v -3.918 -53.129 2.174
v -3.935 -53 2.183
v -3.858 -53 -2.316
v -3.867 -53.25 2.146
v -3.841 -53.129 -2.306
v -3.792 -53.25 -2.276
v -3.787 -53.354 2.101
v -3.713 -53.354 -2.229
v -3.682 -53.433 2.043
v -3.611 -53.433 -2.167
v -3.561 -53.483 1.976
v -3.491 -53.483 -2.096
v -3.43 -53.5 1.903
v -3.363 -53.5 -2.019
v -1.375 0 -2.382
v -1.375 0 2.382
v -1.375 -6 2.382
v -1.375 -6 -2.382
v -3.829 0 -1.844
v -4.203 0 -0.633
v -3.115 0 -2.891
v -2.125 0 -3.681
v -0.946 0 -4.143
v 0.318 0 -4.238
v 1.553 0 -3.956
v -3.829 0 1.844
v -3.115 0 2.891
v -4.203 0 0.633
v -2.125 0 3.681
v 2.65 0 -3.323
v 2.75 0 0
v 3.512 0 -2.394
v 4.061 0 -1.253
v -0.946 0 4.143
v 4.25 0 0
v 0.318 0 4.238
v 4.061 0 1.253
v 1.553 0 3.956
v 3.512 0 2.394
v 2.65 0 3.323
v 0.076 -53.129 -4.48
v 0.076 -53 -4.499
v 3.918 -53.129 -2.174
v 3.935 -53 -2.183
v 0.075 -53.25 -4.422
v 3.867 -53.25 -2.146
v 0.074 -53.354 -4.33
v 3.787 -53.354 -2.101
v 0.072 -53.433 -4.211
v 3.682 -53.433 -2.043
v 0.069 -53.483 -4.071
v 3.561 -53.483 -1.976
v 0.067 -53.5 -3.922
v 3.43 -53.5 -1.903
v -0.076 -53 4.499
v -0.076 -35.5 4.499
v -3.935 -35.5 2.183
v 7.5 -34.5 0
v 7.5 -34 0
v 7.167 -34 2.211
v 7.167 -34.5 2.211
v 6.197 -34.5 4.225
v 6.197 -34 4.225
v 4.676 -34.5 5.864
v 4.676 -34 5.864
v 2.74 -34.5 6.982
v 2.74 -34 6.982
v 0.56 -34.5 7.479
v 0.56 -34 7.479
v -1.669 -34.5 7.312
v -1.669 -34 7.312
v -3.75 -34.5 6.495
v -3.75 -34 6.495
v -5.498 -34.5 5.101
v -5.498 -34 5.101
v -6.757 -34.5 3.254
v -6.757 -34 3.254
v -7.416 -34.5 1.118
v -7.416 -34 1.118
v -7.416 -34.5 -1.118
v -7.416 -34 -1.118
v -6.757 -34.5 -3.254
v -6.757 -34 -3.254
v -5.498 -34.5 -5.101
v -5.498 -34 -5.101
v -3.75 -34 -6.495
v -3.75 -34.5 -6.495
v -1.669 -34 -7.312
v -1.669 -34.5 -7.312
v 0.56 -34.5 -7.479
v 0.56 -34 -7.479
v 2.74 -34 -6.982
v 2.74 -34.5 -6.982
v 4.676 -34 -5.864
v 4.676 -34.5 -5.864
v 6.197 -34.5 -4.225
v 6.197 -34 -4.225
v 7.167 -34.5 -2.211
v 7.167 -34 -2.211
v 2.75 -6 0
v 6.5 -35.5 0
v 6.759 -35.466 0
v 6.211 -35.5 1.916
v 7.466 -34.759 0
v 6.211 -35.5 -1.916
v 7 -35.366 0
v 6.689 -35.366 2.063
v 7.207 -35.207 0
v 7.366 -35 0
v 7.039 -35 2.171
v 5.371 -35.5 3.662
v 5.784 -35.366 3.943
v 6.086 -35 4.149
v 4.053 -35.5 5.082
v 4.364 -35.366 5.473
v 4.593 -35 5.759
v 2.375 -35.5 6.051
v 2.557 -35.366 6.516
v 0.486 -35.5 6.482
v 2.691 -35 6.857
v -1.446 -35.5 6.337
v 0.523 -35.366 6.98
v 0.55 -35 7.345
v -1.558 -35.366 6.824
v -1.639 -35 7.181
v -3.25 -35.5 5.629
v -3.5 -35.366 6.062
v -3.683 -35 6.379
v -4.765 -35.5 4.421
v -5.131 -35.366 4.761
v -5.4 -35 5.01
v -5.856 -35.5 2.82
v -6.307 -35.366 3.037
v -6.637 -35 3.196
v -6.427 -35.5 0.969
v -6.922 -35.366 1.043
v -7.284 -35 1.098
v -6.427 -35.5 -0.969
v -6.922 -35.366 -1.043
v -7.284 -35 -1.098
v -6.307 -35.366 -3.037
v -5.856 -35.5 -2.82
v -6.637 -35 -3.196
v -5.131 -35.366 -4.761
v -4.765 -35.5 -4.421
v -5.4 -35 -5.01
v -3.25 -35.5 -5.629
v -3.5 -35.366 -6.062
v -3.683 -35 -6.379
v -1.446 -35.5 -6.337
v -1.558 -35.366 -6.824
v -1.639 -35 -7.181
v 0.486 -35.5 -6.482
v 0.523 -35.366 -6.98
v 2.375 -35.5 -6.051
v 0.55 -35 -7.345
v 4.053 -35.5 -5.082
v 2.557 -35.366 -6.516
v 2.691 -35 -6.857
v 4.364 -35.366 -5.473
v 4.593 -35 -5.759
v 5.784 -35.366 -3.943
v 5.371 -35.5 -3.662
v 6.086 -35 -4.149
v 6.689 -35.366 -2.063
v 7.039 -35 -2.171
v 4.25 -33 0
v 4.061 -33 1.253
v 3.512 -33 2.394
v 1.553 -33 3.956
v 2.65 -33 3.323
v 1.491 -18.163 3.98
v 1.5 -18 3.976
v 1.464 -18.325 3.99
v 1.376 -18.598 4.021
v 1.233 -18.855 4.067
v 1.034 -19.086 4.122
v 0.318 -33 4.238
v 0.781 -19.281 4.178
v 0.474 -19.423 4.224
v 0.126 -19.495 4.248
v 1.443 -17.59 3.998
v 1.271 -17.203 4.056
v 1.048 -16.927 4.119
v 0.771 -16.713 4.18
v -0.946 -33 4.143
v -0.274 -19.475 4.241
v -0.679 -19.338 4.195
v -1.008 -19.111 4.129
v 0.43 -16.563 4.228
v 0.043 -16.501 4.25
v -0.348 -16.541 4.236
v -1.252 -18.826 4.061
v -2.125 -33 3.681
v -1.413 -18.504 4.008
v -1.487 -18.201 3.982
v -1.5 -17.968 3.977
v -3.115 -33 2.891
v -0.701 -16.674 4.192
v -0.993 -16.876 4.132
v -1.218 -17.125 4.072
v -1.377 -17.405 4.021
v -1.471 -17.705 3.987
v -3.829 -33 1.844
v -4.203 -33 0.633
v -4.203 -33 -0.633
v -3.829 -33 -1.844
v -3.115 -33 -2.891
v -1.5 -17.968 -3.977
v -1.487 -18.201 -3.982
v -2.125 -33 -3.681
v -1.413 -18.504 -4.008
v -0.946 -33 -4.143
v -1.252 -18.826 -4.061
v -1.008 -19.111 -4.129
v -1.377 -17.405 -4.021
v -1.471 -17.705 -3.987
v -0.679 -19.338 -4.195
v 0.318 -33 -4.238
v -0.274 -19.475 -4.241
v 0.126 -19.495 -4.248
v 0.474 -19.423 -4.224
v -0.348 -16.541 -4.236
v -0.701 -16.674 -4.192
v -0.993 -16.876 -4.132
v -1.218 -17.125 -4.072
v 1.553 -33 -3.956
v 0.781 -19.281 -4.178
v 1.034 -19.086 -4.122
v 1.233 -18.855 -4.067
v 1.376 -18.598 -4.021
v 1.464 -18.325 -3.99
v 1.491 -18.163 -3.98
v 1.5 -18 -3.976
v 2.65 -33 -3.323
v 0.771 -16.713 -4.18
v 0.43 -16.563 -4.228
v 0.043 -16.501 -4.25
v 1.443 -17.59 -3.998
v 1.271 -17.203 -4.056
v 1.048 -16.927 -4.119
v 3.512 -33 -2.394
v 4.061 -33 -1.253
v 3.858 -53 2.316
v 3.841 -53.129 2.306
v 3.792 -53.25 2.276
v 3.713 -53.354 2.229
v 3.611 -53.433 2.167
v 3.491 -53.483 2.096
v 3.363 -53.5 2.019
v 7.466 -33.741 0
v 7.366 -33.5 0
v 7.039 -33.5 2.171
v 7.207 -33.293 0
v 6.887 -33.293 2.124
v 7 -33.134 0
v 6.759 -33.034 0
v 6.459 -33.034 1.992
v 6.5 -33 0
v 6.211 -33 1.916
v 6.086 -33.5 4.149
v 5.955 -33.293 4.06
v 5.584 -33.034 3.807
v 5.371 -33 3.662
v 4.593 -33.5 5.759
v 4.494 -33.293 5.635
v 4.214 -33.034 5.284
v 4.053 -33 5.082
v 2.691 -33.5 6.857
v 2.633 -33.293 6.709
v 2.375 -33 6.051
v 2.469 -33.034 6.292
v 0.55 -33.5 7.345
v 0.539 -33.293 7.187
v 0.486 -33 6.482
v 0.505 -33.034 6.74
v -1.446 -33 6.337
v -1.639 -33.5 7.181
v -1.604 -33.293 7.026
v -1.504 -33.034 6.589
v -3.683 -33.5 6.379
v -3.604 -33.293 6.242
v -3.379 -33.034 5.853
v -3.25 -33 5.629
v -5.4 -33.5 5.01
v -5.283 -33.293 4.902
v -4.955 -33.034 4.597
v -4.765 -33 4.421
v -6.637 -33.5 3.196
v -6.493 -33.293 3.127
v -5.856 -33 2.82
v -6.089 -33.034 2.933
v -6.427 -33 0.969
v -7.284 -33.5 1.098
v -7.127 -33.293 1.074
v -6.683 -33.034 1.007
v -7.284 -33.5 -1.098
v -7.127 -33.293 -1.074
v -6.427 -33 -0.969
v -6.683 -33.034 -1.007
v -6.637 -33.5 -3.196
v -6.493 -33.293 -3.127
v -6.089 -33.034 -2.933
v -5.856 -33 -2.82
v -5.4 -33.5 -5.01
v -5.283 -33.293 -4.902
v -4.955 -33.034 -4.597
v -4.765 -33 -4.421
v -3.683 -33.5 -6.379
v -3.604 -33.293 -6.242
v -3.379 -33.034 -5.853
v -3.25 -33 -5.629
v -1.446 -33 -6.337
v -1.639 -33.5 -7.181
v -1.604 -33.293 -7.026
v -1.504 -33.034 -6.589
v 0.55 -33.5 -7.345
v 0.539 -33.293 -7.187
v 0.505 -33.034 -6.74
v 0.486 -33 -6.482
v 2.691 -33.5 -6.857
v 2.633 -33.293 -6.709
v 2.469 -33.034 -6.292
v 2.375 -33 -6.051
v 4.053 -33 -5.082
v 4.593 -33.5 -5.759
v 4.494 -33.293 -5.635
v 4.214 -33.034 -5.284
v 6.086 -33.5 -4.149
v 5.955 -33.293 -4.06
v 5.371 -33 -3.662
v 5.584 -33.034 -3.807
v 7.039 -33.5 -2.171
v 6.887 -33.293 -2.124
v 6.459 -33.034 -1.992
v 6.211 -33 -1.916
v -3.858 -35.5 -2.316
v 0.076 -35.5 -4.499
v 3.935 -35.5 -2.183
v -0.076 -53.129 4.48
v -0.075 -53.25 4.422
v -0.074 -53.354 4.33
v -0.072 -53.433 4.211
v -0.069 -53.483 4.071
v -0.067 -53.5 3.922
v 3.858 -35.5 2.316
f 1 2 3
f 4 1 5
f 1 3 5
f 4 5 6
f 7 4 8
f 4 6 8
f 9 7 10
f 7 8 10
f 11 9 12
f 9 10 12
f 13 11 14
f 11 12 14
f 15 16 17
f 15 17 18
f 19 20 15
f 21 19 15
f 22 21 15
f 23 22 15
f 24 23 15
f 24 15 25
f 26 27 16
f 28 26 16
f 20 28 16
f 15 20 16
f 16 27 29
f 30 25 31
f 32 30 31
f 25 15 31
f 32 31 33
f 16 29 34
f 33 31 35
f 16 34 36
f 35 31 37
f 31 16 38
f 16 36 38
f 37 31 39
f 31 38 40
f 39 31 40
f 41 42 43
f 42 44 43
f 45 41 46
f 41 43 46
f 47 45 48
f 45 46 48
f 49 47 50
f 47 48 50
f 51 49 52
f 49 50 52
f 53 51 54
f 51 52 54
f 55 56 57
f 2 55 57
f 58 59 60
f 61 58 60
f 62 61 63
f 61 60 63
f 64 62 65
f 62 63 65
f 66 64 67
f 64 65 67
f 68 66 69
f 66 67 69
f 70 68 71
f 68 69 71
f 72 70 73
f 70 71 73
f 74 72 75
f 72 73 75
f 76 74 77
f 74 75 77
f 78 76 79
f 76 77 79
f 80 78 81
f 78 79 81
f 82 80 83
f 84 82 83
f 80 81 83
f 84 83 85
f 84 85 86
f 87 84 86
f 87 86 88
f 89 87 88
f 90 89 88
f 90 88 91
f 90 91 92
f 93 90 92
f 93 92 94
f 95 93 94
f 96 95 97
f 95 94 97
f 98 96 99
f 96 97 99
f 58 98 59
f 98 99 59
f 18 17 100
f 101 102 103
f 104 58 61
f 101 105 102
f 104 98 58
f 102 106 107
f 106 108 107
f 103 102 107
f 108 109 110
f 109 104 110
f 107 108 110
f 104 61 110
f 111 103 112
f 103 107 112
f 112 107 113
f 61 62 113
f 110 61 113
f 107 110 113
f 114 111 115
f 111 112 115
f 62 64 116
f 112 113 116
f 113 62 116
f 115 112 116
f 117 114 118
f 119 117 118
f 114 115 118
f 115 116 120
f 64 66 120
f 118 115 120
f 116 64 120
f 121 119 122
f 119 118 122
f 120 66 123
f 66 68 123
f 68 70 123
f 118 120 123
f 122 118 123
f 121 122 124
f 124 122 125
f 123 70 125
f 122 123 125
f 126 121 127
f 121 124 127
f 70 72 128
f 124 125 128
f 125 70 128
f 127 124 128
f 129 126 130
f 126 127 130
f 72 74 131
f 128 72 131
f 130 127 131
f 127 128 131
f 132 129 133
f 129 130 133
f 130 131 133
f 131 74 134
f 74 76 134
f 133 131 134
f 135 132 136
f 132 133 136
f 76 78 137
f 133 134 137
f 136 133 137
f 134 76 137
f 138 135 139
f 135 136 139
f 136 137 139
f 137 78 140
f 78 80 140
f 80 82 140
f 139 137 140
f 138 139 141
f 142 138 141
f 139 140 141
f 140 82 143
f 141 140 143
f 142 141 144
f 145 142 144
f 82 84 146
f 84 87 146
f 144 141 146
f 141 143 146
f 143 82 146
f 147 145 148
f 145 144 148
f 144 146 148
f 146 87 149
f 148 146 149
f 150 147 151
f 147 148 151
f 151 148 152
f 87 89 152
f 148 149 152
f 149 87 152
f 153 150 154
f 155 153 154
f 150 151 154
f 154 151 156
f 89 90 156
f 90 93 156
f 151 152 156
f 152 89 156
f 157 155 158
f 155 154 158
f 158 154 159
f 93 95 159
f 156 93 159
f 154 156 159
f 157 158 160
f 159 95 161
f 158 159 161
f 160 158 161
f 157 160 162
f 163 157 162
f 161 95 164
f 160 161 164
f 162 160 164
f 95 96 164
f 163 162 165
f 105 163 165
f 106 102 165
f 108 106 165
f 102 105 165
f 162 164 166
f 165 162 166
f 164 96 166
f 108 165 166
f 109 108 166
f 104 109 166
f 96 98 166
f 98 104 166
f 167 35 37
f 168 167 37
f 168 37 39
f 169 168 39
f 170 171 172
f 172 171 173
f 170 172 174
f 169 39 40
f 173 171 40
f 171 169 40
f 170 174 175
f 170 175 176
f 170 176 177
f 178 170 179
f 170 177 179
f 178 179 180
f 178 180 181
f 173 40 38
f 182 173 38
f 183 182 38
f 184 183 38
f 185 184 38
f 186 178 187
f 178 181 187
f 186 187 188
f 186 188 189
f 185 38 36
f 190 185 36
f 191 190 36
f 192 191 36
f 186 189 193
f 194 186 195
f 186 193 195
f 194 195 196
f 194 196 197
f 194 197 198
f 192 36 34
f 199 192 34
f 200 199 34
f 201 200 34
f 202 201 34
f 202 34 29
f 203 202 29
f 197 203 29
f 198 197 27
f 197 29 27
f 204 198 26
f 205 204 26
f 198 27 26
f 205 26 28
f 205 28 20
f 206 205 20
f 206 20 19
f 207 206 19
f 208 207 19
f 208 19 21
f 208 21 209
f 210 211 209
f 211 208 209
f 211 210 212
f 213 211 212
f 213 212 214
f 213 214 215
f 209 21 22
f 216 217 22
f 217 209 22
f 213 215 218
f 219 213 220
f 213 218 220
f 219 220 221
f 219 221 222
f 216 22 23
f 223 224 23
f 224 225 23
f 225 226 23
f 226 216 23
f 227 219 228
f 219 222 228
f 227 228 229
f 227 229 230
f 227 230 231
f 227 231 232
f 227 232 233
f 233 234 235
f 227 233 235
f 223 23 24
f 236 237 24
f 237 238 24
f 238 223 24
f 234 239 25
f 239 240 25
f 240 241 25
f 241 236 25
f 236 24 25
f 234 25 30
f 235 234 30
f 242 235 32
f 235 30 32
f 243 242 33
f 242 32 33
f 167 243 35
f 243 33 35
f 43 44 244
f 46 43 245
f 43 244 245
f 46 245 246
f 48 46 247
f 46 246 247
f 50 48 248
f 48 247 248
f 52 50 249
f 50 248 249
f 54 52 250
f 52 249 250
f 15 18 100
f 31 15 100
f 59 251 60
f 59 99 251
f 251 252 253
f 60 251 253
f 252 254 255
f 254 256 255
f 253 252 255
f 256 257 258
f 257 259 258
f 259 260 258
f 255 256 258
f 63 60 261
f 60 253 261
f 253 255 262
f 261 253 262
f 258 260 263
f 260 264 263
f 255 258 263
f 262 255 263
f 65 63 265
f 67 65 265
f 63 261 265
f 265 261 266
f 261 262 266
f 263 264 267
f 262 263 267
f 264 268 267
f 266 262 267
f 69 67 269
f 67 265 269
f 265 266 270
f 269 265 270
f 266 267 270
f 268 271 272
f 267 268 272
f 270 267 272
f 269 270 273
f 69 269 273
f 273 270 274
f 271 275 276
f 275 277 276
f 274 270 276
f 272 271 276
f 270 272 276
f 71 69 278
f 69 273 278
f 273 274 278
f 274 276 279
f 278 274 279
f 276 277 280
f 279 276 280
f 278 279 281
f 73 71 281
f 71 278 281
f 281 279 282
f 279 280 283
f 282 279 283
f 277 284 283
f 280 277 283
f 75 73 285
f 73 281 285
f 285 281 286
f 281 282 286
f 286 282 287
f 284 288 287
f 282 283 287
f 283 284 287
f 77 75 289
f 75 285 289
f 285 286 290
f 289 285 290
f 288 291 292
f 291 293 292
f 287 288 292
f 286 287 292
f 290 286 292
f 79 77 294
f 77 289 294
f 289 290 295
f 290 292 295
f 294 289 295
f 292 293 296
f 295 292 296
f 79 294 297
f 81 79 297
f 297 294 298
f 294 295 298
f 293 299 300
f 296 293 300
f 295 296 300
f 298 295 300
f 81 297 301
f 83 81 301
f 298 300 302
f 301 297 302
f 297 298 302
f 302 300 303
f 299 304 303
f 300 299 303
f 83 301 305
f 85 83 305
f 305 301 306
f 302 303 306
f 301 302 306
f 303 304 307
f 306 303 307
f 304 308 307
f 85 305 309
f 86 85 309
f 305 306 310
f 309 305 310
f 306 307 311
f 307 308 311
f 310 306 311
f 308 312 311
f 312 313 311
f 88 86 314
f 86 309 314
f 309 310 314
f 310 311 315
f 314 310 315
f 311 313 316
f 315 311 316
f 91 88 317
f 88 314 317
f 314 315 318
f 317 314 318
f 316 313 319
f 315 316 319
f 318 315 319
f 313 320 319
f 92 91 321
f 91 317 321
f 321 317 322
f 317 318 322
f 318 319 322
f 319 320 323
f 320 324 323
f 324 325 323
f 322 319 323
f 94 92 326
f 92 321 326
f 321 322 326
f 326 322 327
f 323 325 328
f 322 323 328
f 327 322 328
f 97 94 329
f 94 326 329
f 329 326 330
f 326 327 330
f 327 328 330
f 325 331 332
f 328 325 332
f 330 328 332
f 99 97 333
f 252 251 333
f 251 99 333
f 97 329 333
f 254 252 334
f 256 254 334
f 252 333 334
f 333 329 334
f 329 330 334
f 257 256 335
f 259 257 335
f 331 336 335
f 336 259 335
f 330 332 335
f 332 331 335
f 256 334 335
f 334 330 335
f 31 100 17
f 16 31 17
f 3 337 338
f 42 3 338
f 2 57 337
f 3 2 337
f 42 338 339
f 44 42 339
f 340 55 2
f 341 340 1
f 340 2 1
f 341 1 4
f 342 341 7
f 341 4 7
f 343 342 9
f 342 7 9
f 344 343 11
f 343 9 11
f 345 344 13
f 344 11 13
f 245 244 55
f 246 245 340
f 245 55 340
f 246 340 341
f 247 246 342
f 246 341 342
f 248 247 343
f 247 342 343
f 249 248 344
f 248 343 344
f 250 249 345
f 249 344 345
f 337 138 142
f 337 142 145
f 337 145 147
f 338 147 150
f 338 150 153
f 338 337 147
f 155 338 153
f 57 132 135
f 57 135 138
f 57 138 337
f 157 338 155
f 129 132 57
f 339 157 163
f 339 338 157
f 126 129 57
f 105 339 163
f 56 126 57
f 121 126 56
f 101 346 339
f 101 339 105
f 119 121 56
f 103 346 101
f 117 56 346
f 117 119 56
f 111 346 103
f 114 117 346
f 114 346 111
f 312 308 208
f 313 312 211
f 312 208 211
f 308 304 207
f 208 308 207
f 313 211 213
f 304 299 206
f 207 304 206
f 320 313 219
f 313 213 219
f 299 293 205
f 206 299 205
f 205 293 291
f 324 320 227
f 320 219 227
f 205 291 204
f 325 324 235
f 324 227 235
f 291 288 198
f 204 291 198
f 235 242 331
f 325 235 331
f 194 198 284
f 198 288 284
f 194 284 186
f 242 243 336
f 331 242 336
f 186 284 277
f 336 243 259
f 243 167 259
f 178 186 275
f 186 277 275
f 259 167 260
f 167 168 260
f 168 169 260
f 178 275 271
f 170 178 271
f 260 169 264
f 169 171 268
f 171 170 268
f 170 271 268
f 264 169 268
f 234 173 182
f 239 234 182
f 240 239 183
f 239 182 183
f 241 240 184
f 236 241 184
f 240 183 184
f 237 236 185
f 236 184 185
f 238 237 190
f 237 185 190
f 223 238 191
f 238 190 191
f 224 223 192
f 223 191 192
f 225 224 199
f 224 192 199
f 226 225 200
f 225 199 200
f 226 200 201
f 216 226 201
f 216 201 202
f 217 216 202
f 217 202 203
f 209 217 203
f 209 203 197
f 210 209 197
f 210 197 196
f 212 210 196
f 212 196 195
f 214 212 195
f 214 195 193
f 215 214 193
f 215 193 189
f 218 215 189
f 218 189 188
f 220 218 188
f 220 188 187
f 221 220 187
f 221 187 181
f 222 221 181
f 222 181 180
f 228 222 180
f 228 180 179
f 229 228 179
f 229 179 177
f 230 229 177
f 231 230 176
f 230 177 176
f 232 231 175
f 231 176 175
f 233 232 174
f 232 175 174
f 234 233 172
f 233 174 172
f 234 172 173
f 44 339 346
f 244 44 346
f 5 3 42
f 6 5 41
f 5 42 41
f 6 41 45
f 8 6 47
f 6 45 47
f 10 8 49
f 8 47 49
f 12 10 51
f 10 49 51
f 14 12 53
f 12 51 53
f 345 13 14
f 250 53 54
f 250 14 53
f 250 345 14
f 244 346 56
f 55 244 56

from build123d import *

# Parameters (mm, degrees)
F0_R      = 4.25
F1_DEPTH  = 33
F2_DEPTH  = 6
F3_R      = 7.5
F3_R_2    = 4.25
F4_DEPTH  = 2.5
F6_DEPTH  = 18
F7_R      = 0.5
F8_R      = 1
F10_R     = 1.5
F11_DEPTH = 40


with BuildPart() as f1:
    # F0 (on Front) → F1 (new body)
    with BuildSketch(Plane.XZ):
        Circle(F0_R)
        Polygon((-1.375, 2.38157), (2.75, 0), (-1.375, -2.38157), align=None, mode=Mode.SUBTRACT)
        Polygon((-1.375, -2.38157), (2.75, 0), (-1.375, 2.38157), align=None)
    extrude(amount=F1_DEPTH)

    # F0 (on Front) → F2 (cut)
    with BuildSketch(Plane.XZ):
        Polygon((-1.375, -2.38157), (2.75, 0), (-1.375, 2.38157), align=None)
    extrude(amount=F2_DEPTH, mode=Mode.SUBTRACT)

    # F3 (on face) → F4 (join)
    with BuildSketch(Plane.XZ.offset(33)):
        Circle(F3_R)
        Circle(F3_R_2, mode=Mode.SUBTRACT)
        Circle(F3_R_2)
    extrude(amount=F4_DEPTH)

    # F5 (on face) → F6 (join)
    with BuildSketch(Plane.XZ.offset(35.5)):
        Polygon((0.076423, -4.499351), (3.934764, -2.183492), (3.858341, 2.315859), (-0.076423, 4.499351), (-3.934764, 2.183492), (-3.858341, -2.315859), align=None)
    extrude(amount=F6_DEPTH)

    # F7
    f7_edges = [f1.edges().sort_by_distance(p)[0] for p in [
        (2.005593, -53.5, -3.341421),
        (-1.890959, -53.5, -3.407605),
        (-3.896552, -53.5, -0.066184),
        (-2.005593, -53.5, 3.341421),
        (1.890959, -53.5, 3.407605),
        (3.896552, -53.5, 0.066184),
    ]]
    fillet(f7_edges, radius=F7_R)

    # F8
    f8_edges = [f1.edges().sort_by_distance(p)[0] for p in [
        (-7.5, -35.5, 0),
        (-7.5, -33, 0),
    ]]
    fillet(f8_edges, radius=F8_R)

    # F10 (on offset) → F11 (cut)
    with BuildSketch(Plane.XY.offset(25)):
        with Locations((0, -18)):
            Circle(F10_R)
    extrude(amount=-F11_DEPTH, mode=Mode.SUBTRACT)


solid = f1.part
